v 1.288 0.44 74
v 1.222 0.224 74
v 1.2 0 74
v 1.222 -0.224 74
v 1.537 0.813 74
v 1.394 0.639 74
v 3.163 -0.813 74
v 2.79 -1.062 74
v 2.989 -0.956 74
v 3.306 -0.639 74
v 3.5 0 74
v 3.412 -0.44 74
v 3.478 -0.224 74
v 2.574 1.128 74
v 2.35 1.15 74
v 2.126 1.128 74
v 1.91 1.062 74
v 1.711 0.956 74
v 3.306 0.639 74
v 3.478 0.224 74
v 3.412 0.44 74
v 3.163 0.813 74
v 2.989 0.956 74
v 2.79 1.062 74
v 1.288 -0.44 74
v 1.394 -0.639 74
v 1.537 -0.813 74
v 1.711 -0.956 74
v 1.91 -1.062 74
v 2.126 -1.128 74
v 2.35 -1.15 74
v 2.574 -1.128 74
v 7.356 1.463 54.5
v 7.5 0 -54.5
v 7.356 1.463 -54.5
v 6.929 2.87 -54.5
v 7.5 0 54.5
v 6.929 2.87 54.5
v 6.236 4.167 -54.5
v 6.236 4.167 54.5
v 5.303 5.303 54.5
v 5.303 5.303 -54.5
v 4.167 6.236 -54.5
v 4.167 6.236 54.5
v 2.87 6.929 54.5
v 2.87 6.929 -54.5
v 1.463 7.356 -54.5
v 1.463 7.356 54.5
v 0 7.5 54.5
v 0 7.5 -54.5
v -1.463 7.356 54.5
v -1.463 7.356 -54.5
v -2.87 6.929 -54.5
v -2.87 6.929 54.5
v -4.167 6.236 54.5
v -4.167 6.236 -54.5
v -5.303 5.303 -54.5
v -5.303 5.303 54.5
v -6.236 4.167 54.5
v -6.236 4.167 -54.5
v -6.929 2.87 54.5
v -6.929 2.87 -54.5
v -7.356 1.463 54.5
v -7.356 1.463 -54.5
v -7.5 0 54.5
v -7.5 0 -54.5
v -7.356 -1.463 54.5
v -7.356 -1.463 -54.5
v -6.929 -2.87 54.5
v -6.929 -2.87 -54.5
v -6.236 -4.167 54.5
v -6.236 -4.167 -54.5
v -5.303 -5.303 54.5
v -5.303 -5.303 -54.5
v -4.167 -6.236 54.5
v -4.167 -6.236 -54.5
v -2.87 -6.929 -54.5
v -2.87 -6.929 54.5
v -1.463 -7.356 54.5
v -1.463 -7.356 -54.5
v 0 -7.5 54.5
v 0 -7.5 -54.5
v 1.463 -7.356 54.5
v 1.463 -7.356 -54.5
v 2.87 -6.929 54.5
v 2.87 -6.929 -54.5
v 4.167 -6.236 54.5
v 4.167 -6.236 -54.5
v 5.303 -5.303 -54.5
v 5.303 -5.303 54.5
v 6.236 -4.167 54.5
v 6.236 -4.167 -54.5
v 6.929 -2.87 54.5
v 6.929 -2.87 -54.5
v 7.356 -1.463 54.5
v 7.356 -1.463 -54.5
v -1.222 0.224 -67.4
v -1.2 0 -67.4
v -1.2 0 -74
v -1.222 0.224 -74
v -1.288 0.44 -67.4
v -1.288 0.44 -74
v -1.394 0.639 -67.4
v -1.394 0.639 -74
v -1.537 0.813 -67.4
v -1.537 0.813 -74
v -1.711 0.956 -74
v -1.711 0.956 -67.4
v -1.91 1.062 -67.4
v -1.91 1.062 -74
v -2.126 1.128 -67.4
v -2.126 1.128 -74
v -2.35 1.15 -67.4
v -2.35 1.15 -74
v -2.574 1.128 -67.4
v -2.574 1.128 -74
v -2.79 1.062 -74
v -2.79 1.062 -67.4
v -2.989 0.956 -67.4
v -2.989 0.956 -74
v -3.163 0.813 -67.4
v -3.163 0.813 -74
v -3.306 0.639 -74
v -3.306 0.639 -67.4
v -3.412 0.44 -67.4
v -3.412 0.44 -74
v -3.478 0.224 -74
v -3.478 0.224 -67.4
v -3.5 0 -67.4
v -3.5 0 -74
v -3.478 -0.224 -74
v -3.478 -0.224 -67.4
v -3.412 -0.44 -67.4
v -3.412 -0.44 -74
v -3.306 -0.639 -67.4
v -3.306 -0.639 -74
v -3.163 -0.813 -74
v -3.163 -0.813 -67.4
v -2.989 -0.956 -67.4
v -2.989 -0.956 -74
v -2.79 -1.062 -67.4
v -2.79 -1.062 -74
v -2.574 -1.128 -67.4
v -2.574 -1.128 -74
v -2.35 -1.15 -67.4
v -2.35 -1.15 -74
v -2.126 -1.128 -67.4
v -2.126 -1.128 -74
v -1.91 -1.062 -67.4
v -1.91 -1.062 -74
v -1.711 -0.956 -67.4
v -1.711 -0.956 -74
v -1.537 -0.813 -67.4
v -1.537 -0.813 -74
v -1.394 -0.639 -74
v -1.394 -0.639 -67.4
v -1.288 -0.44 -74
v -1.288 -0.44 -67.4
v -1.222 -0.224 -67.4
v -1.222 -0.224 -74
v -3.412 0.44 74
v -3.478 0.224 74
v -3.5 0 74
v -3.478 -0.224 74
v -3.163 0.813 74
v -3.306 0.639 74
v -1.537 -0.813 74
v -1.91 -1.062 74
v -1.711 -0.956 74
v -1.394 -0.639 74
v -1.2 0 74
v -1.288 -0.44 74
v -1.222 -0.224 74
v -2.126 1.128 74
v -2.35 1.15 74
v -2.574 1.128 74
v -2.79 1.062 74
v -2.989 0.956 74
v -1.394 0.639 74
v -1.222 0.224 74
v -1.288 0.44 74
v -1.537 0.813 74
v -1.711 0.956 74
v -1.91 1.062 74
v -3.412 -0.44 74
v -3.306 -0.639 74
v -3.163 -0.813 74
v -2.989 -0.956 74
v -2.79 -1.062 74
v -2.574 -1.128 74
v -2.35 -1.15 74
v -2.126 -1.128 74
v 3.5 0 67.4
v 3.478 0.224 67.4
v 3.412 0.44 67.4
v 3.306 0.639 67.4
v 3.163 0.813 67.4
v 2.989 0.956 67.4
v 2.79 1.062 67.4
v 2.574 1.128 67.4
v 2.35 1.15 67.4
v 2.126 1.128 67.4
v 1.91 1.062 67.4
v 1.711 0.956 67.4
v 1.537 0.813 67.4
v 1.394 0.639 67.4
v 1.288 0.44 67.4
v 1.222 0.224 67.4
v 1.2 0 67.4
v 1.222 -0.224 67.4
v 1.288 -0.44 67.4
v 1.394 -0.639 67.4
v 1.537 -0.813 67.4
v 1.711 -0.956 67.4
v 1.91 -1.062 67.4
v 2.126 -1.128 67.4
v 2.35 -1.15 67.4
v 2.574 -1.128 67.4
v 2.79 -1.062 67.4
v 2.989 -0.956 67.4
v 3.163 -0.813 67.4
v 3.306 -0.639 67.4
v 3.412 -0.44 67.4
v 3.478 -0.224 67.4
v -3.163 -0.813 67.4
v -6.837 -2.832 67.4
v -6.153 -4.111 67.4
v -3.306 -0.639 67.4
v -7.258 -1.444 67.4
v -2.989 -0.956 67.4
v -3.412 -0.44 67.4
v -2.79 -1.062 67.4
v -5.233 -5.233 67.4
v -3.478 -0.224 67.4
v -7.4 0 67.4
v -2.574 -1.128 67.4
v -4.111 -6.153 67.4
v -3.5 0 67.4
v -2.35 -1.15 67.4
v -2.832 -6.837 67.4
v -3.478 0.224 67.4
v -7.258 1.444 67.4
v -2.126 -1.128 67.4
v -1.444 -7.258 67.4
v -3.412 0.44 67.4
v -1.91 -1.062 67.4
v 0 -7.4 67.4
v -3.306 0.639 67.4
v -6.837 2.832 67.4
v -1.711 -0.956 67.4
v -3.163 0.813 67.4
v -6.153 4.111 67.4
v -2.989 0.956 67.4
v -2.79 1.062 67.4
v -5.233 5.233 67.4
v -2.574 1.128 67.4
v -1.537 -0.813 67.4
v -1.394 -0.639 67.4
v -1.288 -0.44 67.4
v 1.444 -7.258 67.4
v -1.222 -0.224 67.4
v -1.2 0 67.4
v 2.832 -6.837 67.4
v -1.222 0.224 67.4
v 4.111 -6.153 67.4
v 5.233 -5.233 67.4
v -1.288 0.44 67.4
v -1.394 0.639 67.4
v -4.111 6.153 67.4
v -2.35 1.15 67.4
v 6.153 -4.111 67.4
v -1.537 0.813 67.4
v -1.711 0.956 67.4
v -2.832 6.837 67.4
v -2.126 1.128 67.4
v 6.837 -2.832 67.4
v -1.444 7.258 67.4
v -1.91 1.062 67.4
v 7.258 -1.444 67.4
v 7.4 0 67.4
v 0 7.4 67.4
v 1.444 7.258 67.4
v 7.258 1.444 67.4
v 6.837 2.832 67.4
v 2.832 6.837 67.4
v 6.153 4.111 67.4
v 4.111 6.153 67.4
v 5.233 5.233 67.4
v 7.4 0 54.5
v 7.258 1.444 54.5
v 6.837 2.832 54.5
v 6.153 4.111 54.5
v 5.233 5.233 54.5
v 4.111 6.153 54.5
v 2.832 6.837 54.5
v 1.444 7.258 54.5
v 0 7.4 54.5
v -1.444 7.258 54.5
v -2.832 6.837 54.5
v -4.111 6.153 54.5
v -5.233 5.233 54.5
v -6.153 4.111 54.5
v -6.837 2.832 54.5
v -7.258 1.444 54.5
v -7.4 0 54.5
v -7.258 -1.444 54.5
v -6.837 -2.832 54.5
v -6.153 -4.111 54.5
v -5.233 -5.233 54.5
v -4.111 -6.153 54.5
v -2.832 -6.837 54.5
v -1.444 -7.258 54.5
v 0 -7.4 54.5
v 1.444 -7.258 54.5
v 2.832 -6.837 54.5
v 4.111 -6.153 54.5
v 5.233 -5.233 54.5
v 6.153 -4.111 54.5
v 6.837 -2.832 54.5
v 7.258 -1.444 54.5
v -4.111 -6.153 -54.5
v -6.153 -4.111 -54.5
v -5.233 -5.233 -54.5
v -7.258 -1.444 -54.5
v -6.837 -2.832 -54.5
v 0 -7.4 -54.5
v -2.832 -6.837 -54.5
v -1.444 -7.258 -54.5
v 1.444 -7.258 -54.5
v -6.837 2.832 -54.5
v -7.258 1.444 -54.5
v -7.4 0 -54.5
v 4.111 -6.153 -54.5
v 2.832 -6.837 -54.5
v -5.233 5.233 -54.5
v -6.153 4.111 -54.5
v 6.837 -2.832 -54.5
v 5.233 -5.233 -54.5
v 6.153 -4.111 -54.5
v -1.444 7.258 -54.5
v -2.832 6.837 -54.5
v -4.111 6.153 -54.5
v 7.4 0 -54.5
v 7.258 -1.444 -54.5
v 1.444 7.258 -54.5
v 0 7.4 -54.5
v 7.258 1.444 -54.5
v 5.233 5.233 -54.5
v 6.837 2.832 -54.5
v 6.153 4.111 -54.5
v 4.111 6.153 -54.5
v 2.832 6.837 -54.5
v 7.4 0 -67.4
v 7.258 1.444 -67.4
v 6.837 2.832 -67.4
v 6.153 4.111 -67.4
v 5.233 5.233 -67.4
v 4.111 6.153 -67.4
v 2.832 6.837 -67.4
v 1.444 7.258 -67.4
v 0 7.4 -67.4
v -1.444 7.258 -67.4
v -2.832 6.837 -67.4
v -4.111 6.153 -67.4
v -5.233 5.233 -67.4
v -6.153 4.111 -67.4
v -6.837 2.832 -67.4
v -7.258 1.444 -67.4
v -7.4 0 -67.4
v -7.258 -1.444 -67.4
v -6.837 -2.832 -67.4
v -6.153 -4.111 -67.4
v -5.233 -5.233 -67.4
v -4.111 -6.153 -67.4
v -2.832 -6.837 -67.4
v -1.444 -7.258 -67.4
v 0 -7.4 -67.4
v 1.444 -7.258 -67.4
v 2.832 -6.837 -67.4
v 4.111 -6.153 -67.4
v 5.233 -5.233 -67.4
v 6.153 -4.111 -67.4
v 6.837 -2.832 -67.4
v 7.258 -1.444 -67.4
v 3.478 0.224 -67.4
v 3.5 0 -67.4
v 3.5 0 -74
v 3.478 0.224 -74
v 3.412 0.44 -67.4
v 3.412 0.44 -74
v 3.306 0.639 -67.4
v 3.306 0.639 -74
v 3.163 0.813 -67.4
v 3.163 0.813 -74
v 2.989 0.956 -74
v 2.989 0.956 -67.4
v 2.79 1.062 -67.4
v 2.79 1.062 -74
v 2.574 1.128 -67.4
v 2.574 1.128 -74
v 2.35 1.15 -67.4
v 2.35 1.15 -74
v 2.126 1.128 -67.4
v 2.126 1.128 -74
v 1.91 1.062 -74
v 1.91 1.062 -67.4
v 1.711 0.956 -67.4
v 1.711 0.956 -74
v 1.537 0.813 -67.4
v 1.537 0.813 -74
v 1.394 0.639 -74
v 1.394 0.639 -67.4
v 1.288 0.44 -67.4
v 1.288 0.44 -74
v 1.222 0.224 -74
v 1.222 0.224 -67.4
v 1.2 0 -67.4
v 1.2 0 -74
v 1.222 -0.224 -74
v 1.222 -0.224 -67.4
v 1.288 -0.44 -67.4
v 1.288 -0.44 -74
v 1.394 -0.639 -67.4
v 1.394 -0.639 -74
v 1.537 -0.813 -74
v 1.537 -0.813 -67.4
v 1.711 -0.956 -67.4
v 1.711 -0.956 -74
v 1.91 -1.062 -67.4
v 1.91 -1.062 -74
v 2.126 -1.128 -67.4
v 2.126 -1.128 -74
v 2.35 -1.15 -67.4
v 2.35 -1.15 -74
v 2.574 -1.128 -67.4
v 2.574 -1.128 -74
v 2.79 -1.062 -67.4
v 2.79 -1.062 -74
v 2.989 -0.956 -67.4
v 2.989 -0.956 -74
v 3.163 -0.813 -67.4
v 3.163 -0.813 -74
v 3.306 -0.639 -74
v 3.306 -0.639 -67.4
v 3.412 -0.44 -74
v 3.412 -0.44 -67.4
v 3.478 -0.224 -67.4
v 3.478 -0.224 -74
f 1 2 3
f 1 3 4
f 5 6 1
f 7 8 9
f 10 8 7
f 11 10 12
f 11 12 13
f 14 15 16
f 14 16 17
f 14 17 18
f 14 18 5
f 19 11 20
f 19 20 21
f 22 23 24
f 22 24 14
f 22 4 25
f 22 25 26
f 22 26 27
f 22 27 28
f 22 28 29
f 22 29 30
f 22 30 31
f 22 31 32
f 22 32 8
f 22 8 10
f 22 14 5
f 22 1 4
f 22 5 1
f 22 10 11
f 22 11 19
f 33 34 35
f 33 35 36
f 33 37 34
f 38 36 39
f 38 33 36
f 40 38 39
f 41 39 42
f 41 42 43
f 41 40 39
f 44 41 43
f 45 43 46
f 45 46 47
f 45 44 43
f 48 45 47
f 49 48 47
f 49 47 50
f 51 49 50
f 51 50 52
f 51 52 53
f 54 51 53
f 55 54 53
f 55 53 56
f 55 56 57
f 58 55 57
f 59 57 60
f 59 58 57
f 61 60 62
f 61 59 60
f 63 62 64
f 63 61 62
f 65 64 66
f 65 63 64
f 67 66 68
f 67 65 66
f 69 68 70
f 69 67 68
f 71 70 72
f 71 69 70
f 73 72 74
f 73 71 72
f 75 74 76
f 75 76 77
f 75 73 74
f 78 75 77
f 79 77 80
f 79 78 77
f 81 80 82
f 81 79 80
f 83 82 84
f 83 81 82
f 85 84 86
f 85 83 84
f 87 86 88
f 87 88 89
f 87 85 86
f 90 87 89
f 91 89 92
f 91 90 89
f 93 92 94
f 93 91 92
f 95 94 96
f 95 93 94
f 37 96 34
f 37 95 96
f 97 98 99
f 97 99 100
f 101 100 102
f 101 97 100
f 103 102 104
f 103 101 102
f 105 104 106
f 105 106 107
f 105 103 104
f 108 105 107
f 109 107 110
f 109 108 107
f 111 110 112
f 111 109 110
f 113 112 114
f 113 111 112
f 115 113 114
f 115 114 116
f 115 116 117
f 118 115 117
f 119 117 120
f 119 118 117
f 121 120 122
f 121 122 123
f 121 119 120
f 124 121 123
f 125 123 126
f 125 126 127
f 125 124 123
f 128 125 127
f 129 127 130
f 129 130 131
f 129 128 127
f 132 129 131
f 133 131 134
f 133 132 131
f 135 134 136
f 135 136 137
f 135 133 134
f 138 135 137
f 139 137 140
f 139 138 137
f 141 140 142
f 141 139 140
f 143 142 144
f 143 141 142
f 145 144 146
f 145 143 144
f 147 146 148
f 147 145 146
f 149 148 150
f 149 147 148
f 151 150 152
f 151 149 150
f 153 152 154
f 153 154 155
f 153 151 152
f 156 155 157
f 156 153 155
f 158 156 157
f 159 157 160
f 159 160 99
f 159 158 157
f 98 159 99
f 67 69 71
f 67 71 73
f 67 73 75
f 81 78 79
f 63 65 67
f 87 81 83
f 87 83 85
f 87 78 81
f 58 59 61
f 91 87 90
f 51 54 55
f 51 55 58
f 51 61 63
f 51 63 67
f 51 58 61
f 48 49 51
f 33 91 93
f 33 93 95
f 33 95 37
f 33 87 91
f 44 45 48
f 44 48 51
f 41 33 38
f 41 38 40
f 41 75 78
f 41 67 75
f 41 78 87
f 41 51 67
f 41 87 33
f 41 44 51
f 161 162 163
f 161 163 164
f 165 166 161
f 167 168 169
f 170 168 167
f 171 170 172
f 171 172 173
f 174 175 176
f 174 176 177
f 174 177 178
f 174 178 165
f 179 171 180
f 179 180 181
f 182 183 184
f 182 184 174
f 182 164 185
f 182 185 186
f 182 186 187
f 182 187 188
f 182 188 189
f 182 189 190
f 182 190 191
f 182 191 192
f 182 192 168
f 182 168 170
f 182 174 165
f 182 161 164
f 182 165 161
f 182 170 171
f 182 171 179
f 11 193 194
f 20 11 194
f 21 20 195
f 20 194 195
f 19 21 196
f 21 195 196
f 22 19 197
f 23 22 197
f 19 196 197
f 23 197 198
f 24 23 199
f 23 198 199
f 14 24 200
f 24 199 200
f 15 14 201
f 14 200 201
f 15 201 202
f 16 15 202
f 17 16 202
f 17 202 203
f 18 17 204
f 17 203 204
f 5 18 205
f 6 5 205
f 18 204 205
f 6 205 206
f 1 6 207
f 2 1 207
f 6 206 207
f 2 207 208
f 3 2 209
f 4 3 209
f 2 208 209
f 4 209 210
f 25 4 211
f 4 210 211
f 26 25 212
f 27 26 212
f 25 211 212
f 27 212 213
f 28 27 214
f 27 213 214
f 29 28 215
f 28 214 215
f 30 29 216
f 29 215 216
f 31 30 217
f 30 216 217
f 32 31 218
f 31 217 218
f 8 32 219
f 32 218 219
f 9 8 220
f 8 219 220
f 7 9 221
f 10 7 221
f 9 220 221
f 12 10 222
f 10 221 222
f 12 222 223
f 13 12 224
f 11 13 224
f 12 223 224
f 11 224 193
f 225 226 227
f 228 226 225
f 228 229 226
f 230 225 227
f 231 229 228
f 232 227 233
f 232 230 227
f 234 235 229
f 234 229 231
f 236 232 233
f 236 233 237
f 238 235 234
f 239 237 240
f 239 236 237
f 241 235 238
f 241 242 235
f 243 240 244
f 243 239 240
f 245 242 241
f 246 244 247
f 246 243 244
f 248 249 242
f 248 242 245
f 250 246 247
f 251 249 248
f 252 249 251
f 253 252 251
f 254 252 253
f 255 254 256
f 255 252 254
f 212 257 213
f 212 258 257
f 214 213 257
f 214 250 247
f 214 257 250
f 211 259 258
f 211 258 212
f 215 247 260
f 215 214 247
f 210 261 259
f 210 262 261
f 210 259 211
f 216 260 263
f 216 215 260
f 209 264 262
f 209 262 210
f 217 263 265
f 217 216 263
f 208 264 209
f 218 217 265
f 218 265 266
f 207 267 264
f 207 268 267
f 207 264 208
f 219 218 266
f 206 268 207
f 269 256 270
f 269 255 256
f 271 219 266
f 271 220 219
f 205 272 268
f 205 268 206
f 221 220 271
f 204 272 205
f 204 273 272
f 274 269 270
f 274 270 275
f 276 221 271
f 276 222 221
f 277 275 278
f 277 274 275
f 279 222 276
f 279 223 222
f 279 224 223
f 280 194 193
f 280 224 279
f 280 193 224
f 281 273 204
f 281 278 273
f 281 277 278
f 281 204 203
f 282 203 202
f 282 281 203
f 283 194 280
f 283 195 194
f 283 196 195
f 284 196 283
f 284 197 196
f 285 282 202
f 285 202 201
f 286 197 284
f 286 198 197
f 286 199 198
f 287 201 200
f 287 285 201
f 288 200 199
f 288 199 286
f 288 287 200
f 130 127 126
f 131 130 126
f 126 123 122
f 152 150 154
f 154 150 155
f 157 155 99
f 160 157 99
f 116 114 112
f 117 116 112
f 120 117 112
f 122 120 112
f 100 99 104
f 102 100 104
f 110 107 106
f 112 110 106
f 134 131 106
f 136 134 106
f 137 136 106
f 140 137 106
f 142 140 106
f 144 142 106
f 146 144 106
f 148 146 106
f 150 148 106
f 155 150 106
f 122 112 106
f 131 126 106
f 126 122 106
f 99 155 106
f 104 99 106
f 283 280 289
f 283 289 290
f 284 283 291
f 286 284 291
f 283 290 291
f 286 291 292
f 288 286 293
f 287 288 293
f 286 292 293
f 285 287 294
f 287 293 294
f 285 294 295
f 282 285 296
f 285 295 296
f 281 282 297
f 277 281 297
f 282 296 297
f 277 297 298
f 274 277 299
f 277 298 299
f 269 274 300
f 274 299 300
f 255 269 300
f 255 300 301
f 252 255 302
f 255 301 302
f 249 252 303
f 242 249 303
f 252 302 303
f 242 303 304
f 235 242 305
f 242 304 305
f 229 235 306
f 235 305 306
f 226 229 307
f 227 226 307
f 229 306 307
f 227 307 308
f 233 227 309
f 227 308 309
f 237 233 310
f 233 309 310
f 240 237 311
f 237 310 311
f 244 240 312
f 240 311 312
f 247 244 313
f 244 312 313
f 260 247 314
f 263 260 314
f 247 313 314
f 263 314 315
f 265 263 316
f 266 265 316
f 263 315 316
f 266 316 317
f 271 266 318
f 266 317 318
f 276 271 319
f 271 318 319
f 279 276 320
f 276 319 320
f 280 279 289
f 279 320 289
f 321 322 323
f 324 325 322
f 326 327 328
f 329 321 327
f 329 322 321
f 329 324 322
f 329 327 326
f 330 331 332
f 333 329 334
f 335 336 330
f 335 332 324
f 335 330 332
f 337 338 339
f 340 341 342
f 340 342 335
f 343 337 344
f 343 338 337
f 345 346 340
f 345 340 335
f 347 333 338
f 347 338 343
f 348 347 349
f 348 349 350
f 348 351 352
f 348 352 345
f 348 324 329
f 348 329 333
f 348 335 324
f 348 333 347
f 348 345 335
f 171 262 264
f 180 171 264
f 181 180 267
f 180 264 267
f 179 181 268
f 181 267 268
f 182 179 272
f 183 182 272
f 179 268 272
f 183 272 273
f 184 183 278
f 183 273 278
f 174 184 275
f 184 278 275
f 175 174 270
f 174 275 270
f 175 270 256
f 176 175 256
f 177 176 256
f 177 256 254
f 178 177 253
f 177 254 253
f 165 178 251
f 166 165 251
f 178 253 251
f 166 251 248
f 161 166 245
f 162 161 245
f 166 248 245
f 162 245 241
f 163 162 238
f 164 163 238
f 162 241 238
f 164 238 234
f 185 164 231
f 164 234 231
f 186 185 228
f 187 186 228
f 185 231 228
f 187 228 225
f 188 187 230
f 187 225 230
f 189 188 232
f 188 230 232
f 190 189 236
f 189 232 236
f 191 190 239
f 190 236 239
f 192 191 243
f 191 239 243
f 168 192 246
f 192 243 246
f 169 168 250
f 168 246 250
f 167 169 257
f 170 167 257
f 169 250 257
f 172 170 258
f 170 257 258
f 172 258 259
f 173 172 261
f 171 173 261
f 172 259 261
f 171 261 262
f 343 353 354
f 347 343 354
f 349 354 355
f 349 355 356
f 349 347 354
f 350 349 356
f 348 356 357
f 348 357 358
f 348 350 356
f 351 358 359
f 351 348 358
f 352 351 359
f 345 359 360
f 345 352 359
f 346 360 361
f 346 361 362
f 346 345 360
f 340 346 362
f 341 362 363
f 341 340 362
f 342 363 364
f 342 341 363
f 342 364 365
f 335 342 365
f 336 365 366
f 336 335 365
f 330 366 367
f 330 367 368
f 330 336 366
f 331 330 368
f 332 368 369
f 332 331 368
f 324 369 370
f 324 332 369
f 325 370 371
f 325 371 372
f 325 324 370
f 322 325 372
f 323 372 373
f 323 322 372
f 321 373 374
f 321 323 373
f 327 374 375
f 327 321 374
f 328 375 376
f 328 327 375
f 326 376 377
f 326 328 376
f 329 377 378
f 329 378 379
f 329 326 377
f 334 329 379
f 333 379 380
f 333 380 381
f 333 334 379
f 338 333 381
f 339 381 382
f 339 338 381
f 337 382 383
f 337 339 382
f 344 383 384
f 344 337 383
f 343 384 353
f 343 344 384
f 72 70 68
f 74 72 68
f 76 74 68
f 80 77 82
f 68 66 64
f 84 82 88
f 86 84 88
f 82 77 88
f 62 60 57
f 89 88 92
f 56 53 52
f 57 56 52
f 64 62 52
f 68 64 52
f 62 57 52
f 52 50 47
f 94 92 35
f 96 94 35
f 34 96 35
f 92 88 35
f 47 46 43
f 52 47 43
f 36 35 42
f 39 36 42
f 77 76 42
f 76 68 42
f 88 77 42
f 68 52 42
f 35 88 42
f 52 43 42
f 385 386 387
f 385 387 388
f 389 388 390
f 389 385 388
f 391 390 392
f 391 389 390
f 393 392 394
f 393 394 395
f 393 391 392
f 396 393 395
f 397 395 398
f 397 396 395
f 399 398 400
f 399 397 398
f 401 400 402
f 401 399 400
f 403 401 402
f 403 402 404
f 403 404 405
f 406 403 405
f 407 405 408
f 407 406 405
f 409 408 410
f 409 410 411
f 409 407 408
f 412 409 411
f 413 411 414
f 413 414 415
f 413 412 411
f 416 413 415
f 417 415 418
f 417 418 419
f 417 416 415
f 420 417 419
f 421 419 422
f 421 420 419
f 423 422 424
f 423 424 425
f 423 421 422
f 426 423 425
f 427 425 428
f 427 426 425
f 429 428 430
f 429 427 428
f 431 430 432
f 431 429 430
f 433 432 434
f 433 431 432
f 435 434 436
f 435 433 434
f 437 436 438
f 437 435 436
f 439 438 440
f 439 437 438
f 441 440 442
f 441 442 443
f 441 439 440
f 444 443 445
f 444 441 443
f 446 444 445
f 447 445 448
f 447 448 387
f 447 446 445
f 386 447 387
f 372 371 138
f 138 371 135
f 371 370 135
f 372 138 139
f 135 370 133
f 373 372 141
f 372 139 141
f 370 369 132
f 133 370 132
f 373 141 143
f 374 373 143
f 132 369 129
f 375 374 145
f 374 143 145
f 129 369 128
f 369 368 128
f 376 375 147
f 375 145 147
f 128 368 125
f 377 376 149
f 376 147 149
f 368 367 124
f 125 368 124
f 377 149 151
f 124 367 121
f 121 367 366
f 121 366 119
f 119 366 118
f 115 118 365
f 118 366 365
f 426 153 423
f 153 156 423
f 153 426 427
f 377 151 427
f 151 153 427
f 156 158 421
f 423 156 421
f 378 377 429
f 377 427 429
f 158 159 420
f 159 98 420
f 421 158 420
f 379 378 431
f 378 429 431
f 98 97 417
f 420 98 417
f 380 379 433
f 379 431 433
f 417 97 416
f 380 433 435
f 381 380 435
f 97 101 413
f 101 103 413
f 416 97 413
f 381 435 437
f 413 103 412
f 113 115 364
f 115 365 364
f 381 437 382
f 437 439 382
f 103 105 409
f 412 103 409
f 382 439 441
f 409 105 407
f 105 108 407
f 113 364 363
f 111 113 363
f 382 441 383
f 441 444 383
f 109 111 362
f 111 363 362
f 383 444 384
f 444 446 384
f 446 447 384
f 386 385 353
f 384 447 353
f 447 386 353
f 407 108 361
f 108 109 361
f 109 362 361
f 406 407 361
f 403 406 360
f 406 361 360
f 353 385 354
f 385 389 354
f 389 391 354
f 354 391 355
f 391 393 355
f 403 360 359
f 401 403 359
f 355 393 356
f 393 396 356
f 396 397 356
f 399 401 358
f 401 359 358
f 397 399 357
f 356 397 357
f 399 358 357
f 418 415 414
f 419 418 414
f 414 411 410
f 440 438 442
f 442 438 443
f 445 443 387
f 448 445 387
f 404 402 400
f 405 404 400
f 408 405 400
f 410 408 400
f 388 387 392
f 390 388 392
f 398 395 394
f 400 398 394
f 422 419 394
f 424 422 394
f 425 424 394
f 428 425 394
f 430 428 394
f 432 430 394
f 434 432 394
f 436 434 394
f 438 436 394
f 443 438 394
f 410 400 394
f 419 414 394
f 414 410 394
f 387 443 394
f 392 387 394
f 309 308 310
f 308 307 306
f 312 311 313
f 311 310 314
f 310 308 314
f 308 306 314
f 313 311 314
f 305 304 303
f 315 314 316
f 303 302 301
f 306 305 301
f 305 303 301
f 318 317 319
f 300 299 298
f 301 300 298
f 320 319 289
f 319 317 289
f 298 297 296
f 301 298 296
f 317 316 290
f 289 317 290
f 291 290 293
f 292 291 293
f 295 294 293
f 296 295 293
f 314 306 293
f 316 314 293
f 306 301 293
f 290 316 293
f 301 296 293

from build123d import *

# Parameters (mm, degrees)
F0_R     = 7.5
F1_DEPTH = 54.5
F2_R     = 7.4
F3_DEPTH = 12.9
F4_R     = 1.15
F5_DEPTH = 6.6


with BuildPart() as f1:
    # F0 (on Top) → F1 (new body, symmetric)
    with BuildSketch(Plane.XY):
        Circle(F0_R)
    extrude(amount=F1_DEPTH, both=True)


with BuildPart() as f3:
    # F2 (on face) → F3 (new body)
    with BuildSketch(Plane.XY.offset(54.5)):
        Circle(F2_R)
    extrude(amount=F3_DEPTH)

    # F4 (on face) → F5 (join)
    with BuildSketch(Plane.XY.offset(67.4)):
        with Locations((-2.35, 0)):
            Circle(F4_R)
        with Locations((2.35, 0)):
            Circle(F4_R)
    extrude(amount=F5_DEPTH)


with BuildPart() as f6_1:
    # F6: instance of F3
    add(f3.part.mirror(Plane.XY))


solid = Compound([f1.part, f3.part, f6_1.part])
